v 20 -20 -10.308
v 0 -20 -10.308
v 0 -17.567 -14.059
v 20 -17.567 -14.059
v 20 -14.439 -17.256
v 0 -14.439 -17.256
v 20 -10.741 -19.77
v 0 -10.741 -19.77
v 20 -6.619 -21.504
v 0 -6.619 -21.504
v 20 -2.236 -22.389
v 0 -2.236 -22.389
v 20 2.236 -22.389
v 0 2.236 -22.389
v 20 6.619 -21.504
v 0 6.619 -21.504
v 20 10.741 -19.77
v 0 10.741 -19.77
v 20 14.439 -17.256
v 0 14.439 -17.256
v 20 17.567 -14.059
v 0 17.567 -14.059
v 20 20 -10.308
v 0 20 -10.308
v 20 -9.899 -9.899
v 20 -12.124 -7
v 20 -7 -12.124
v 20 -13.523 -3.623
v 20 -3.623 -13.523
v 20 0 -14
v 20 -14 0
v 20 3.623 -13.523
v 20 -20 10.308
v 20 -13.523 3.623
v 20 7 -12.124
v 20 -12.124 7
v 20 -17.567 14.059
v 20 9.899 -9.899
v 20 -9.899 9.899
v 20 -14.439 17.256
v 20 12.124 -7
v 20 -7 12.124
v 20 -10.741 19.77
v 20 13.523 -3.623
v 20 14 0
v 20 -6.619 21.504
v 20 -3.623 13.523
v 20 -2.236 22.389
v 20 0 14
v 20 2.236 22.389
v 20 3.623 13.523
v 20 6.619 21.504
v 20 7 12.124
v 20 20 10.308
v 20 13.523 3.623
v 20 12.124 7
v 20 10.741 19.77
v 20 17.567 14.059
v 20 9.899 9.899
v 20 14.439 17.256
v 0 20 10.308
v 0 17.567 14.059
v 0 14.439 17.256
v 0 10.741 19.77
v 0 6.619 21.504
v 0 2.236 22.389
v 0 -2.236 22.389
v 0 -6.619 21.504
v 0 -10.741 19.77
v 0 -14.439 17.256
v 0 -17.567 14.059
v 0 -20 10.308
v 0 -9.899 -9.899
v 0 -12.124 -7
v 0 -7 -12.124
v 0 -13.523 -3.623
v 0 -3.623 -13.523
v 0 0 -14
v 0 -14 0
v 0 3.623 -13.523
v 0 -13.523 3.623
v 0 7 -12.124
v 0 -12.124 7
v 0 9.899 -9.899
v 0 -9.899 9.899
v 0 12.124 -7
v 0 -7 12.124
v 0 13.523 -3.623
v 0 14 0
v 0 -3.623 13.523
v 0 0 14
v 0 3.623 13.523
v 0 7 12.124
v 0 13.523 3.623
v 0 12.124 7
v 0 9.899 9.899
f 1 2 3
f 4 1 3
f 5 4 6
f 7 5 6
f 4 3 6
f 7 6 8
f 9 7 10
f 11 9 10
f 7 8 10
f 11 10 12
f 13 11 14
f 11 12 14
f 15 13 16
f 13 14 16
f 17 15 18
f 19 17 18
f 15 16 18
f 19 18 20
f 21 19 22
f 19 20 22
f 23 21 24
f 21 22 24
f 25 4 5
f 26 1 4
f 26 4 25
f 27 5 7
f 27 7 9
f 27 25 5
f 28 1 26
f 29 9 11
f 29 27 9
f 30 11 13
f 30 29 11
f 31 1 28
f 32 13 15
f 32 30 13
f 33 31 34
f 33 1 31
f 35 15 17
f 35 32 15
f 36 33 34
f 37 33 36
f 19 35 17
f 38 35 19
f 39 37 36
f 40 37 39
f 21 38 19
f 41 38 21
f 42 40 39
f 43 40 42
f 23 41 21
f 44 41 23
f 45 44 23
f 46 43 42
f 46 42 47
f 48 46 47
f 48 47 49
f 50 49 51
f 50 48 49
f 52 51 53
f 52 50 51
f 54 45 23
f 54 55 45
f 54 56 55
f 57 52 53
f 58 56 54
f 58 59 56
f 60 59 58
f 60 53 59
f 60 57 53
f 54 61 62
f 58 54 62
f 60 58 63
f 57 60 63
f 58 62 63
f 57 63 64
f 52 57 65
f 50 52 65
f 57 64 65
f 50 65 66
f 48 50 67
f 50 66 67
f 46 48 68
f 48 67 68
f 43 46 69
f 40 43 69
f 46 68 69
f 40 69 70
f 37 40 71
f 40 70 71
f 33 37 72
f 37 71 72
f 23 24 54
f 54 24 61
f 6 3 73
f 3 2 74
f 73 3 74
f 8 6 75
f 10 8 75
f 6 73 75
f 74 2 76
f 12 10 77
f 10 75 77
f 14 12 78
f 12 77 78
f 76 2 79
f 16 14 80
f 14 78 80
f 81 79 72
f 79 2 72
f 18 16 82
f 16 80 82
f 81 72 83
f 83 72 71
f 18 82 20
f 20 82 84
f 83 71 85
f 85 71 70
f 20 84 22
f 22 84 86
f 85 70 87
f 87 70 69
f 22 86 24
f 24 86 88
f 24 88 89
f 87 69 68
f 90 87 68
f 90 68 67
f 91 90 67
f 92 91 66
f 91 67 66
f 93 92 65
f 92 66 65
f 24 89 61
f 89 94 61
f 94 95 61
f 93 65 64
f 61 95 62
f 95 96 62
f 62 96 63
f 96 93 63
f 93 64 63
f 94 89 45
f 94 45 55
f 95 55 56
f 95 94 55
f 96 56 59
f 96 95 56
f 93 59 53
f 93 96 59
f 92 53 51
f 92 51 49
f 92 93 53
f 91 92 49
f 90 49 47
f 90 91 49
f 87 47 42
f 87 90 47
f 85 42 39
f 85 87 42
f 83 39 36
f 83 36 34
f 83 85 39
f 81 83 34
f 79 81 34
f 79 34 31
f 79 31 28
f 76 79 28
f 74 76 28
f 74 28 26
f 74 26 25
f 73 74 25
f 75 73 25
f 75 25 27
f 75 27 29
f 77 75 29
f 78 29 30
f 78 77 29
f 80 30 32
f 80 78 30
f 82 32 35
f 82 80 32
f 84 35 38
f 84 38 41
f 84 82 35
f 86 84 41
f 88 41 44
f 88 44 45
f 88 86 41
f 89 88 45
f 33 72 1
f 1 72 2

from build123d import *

# Parameters (mm, degrees)
F0_R     = 14
F1_DEPTH = 20


with BuildPart() as f1:
    # F0 (on Right) → F1 (new body)
    with BuildSketch(Plane.YZ):
        with BuildLine():
            Line((-20, 10.307764), (-20, -10.307764))
            ThreePointArc((-20, -10.307764), (0, -22.5), (20, -10.307764))
            Line((20, -10.307764), (20, 10.307764))
            ThreePointArc((20, 10.307764), (0, 22.5), (-20, 10.307764))
        make_face()
        Circle(F0_R, mode=Mode.SUBTRACT)
    extrude(amount=F1_DEPTH)


solid = f1.part
